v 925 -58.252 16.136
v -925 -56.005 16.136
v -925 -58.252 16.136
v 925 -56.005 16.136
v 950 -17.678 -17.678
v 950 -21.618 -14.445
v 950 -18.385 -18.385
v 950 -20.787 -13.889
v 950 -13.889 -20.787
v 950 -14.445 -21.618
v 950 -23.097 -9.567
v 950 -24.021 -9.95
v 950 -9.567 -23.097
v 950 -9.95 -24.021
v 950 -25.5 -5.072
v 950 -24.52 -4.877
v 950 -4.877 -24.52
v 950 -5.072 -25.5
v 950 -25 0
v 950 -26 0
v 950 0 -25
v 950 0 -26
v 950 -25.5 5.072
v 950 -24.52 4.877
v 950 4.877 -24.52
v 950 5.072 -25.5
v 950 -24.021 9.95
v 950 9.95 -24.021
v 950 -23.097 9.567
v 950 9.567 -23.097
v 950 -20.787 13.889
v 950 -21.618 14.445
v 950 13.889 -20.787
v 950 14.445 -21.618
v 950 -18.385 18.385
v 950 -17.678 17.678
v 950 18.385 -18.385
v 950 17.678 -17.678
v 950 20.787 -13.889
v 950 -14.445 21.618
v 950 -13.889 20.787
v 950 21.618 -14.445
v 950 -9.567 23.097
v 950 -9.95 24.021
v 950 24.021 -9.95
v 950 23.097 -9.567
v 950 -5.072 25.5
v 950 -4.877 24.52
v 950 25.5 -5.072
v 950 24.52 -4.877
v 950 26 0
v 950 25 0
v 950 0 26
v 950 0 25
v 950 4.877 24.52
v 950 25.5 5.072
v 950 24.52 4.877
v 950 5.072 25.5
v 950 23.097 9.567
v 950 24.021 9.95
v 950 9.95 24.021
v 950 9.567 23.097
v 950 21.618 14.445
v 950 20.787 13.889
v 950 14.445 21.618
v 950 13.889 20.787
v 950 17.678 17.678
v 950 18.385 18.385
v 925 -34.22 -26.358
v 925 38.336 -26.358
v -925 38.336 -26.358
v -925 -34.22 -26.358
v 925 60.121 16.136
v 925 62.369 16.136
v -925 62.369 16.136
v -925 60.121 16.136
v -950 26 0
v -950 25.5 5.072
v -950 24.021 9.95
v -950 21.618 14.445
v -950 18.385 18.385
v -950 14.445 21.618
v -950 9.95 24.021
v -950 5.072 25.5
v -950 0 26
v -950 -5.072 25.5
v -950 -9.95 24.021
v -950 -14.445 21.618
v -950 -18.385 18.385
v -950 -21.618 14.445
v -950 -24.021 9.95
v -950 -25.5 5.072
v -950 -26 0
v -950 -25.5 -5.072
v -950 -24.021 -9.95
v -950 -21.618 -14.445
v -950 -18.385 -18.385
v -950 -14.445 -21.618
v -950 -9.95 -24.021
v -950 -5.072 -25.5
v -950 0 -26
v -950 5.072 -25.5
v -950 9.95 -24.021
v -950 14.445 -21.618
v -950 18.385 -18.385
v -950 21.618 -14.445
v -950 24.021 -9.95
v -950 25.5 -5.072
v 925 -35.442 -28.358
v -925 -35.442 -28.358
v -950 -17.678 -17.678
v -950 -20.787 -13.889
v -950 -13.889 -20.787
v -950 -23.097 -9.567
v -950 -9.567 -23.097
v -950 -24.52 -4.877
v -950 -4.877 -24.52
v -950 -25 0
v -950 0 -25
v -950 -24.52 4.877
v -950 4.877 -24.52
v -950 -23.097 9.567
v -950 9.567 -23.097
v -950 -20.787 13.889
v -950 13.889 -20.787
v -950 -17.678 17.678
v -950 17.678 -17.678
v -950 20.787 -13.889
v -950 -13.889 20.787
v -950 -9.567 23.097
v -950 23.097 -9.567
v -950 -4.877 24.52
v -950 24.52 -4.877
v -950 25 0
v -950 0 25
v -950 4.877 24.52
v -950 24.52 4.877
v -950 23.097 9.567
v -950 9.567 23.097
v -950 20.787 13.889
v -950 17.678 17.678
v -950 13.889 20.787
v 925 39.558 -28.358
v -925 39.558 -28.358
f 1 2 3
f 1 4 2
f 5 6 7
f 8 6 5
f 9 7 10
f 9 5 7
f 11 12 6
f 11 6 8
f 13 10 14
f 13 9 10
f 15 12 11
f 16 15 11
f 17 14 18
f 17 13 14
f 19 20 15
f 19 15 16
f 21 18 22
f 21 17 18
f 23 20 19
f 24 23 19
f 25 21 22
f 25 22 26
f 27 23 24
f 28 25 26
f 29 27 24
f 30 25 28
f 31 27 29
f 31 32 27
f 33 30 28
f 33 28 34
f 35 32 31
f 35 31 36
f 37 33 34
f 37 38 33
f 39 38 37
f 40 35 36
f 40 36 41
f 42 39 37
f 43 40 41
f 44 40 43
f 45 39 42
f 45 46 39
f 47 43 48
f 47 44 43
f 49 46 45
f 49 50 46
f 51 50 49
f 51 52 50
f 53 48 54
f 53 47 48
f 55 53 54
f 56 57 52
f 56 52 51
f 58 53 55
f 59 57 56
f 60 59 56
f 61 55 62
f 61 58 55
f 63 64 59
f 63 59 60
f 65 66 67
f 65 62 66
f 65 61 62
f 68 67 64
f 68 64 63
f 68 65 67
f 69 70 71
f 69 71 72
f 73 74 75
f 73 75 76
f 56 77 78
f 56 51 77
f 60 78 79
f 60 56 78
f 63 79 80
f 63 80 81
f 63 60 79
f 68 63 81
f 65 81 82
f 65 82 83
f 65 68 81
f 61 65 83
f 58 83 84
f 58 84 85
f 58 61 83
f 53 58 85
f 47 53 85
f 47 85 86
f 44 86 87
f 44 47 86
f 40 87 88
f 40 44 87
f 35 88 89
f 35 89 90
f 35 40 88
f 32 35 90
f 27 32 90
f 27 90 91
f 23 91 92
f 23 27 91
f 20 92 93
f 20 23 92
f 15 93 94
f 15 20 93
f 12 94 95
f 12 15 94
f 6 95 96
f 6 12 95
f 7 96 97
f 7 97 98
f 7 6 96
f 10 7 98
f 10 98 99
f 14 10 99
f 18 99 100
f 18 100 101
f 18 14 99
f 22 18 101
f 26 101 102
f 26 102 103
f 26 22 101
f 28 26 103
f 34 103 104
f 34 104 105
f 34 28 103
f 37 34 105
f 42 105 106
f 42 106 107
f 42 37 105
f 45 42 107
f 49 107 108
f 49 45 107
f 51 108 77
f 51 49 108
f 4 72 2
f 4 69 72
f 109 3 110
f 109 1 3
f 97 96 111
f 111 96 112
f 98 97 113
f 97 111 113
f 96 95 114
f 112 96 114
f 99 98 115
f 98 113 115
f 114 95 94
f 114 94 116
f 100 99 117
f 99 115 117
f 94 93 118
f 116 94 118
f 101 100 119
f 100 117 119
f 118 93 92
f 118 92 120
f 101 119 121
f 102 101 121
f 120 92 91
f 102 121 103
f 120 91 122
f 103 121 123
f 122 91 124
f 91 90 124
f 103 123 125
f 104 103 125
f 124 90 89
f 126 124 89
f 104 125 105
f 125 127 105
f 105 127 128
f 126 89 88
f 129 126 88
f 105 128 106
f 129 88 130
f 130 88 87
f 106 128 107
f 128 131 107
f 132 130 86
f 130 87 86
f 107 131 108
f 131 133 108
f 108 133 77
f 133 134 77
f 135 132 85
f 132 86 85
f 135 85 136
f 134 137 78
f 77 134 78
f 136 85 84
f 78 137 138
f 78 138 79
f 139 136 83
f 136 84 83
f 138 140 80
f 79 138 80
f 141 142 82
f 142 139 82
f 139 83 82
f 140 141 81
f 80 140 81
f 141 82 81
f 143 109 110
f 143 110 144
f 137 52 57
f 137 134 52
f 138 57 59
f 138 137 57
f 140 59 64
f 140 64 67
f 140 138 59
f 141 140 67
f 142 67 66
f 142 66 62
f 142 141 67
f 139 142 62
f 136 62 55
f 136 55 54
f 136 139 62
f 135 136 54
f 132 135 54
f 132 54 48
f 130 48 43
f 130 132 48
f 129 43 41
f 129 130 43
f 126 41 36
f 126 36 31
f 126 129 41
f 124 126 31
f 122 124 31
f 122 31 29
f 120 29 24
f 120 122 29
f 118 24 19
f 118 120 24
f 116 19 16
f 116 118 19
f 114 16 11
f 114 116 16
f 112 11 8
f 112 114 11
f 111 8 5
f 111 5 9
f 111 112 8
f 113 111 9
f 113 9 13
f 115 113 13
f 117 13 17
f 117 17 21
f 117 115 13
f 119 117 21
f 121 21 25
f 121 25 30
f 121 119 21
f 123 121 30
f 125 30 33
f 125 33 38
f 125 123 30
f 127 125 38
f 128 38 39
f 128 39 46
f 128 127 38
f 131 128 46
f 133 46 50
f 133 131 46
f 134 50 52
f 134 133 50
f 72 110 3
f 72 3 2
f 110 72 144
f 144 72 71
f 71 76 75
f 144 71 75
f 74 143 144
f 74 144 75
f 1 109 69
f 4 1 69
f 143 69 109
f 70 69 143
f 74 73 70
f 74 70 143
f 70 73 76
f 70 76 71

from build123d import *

# Parameters (mm, degrees)
F1_DEPTH = 925
F2_R     = 26
F2_R_2   = 25
F3_DEPTH = 950


with BuildPart() as f1:
    # F0 (on Right) → F1 (new body, symmetric)
    with BuildSketch(Plane.YZ):
        Polygon((-58.252042, 16.136102), (-35.441691, -28.357581), (39.558309, -28.357581), (62.36866, 16.136102), (60.12115, 16.136102), (38.336129, -26.357581), (-34.219511, -26.357581), (-56.004532, 16.136102), align=None)
    extrude(amount=F1_DEPTH, both=True)


with BuildPart() as f3:
    # F2 (on Right) → F3 (new body, symmetric)
    with BuildSketch(Plane.YZ):
        Circle(F2_R)
        Circle(F2_R_2, mode=Mode.SUBTRACT)
    extrude(amount=F3_DEPTH, both=True)


solid = Compound([f1.part, f3.part])
